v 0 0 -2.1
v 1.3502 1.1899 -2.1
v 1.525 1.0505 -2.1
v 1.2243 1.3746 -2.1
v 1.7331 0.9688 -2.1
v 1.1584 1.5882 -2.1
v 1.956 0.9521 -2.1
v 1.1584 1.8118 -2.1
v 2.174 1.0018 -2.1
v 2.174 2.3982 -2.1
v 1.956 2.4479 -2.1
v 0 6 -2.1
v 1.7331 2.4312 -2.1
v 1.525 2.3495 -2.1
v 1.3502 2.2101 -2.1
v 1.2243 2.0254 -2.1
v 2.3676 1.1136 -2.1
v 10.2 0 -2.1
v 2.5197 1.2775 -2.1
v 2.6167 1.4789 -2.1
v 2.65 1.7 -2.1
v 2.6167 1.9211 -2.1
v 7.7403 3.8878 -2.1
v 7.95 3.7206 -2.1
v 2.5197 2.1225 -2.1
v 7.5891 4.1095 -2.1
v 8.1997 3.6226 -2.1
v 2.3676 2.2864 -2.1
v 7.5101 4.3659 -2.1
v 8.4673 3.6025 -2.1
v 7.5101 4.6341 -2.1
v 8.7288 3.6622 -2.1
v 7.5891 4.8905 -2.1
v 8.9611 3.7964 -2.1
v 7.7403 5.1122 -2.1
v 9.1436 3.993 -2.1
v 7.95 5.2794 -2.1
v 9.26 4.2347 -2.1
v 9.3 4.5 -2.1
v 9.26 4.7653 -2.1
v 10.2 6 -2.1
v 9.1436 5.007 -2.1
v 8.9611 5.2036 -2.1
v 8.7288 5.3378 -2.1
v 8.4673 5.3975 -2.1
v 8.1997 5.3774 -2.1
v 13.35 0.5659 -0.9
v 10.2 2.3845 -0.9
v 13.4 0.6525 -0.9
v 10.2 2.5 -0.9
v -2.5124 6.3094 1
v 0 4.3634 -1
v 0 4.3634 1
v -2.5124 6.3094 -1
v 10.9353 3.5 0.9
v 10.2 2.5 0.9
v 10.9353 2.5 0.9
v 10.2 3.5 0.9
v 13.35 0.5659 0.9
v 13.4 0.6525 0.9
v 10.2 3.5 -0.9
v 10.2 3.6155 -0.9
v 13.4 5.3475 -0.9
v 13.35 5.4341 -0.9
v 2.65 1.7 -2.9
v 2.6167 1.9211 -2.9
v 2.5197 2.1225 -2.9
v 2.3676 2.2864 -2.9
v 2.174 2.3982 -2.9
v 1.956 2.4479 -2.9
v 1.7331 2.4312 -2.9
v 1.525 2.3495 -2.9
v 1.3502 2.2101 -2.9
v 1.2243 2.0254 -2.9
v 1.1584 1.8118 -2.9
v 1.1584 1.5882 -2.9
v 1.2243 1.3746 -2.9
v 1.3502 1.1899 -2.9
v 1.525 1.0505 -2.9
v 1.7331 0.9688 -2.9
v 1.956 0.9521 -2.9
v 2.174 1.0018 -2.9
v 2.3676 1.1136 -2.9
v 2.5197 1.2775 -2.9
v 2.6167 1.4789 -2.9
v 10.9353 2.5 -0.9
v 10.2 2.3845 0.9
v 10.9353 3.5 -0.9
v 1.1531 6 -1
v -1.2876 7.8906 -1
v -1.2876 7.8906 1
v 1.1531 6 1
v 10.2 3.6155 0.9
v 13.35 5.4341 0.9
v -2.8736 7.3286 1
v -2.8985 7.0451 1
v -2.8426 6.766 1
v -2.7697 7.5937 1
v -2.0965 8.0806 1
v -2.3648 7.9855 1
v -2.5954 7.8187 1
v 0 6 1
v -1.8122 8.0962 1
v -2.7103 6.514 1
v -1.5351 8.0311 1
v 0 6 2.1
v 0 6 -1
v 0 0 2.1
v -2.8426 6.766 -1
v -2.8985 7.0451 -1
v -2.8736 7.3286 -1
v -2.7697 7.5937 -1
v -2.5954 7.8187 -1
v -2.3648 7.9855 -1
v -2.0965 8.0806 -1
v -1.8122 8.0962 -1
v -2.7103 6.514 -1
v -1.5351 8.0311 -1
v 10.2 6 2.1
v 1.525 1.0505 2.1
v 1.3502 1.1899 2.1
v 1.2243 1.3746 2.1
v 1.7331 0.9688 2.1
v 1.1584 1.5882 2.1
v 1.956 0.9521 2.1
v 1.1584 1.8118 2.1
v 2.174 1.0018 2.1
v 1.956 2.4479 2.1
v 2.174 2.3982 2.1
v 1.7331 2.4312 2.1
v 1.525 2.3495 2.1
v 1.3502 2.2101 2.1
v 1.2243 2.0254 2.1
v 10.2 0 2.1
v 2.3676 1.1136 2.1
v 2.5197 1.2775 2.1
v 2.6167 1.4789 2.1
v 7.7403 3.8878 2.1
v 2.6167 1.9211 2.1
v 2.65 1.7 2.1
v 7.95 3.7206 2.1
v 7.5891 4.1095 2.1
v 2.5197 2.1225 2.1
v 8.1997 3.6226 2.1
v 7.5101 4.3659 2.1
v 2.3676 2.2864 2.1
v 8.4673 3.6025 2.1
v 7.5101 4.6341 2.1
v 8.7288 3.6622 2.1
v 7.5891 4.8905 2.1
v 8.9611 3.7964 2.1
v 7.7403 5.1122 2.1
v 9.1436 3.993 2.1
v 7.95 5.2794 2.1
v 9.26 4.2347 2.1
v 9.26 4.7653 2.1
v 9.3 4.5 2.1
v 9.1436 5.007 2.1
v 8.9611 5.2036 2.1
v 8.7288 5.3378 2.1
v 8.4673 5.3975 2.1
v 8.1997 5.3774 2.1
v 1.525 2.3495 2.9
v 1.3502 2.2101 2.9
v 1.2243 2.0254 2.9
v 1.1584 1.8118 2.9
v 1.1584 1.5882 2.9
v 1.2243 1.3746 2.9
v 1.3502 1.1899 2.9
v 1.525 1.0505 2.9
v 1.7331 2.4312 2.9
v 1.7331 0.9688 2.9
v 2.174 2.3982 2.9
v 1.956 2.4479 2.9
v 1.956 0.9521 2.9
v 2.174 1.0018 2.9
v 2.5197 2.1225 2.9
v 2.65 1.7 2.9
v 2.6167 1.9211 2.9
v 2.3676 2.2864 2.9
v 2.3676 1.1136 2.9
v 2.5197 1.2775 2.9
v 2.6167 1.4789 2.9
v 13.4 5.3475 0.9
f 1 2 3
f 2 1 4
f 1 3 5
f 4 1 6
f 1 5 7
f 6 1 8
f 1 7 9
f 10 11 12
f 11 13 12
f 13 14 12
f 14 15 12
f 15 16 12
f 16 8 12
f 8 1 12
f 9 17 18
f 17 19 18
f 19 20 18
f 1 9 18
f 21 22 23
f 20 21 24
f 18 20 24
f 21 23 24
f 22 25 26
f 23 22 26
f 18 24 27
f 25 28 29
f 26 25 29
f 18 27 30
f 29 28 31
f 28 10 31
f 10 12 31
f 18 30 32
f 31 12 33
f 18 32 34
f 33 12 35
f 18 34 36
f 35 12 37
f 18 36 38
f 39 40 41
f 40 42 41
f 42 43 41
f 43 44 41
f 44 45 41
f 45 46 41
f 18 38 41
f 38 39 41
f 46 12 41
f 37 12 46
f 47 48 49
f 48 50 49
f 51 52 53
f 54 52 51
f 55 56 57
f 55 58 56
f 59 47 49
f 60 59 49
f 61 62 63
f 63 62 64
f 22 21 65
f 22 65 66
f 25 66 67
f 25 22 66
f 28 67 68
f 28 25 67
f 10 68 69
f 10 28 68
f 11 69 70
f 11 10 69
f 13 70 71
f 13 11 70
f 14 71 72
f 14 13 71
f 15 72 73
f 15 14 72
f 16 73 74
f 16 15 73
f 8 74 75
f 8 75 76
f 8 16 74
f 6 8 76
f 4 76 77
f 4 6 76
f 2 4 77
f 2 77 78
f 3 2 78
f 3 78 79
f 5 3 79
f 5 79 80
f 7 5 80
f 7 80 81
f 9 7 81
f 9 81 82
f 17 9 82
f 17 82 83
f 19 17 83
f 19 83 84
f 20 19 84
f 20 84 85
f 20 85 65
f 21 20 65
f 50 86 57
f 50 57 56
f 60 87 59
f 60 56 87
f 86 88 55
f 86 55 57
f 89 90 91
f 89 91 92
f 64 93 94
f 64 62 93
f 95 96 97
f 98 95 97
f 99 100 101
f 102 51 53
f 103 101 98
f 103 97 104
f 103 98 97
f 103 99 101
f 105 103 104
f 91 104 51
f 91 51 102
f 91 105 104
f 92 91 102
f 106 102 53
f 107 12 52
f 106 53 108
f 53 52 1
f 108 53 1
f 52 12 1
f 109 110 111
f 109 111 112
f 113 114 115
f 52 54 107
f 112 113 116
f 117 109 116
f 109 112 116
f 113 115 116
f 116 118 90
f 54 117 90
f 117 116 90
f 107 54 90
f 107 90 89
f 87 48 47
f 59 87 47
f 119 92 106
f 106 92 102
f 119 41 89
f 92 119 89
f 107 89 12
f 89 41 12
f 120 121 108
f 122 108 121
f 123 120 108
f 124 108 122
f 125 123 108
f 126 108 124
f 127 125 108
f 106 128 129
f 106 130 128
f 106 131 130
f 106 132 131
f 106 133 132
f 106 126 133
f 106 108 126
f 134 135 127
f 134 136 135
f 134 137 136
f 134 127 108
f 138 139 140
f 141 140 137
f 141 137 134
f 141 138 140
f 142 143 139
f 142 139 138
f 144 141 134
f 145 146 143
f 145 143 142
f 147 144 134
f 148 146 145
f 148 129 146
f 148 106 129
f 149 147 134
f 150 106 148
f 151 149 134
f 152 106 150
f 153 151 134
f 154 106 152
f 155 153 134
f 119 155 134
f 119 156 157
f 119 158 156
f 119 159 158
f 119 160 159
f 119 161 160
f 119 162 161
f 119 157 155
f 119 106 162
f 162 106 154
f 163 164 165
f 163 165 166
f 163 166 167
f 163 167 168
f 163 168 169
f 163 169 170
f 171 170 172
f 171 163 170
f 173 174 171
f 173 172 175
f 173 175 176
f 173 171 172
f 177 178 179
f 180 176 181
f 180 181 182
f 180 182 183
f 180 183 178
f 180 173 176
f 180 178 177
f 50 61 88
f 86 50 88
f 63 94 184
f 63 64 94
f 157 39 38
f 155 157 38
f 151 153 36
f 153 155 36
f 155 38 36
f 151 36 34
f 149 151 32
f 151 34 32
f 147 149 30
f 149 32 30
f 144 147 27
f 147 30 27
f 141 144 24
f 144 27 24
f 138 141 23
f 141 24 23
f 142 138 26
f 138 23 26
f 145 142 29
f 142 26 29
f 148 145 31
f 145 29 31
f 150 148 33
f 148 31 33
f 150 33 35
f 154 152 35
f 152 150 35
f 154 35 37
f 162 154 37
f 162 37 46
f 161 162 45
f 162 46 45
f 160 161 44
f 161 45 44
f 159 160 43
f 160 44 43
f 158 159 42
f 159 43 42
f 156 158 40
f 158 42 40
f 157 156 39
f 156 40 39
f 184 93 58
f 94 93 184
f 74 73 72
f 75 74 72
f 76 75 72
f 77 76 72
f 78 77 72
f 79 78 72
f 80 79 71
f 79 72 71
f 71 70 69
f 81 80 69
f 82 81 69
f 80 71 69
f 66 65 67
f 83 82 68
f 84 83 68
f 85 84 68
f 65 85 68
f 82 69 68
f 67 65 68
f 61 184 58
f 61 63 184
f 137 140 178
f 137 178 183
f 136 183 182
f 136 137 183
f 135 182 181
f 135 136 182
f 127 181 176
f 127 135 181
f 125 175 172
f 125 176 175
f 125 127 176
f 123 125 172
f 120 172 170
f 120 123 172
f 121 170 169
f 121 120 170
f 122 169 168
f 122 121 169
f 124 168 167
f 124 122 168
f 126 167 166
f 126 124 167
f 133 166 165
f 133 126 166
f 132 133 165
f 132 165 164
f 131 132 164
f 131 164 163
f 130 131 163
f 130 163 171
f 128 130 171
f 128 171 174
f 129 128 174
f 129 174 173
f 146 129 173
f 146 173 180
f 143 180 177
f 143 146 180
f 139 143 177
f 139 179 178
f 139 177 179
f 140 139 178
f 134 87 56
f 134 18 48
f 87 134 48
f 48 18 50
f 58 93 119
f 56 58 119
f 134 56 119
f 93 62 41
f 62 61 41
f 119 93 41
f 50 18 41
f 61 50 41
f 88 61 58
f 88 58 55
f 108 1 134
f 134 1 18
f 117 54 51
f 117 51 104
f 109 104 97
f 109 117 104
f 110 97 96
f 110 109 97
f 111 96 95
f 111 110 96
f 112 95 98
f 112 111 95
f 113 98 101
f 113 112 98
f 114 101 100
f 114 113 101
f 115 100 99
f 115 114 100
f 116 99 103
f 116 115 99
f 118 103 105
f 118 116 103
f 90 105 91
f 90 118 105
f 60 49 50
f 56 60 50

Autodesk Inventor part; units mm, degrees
ref_plane "YZ Plane" through (0, 0, 0) normal (1, 0, 0) x (0, 1, 0)
ref_plane "XZ Plane" through (0, 0, 0) normal (0, 1, 0) x (-1, 0, 0)
ref_plane "XY Plane" through (0, 0, 0) normal (0, 0, 1) x (1, 0, 0)
sketch "Sketch1" plane through (0, 0, 0) normal (0, 0, 1) x (1, 0, 0)
  line L0 (0, 0) -> (10.2, 0)
  line L1 (10.2, 0) -> (10.2, 6)
  line L2 (10.2, 6) -> (0, 6)
  line L3 (0, 6) -> (0, 0)
  circle A0 centre (8.4, 4.5) radius 0.9
  line L4 (10.2, 3.5) -> (10.9353, 3.5)
  line L5 (10.9353, 3.5) -> (10.9353, 2.5)
  line L6 (10.9353, 2.5) -> (10.2, 2.5)
  line L7 (10.2, 2.5) -> (10.2, 3.5)
  line L8 (10.2, 3.5) -> (10.15, 3.5866)
  line L9 (10.15, 3.5866) -> (13.35, 5.4341)
  line L10 (13.35, 5.4341) -> (13.4, 5.3475)
  line L11 (13.4, 5.3475) -> (10.2, 3.5)
  line L12 (10.2, 2.5) -> (10.15, 2.4134)
  line L13 (10.15, 2.4134) -> (13.35, 0.5659)
  line L14 (13.35, 0.5659) -> (13.4, 0.6525)
  line L15 (13.4, 0.6525) -> (10.2, 2.5)
  circle A1 centre (1.9, 1.7) radius 0.75
  line L16 (0, 4.3634) -> (-2.5124, 6.3094)
  line L17 (-2.5124, 6.3094) -> (-1.2876, 7.8906)
  line L18 (-1.2876, 7.8906) -> (1.1531, 6)
  arc A2 (-1.2876, 7.8906) -> (-2.5124, 6.3094) centre (-1.9, 7.1) ccw
  point P0 (10.9353, 3)
  point P1 (10.2, 3)
  dimension "d0" = 10.2
  dimension "d1" = 6
  dimension "d2" = 1.8
  dimension "d3" = 1.5
  dimension "d4" = 1.8
  dimension "d5" = 2.8
  dimension "d6" = 6.5
  dimension "d7" = 1.5
  dimension "d8" = 0.1
  dimension "d9" = 0.1
  dimension "d10" = 2.1
  dimension "d11" = 13.1
  dimension "d12" = 30
  dimension "d13" = 30
  dimension "d15" = 1
  dimension "d16" = 5
  dimension "d17" = 2
extrude "Extrusion1" add sketch "Sketch1" along normal mid plane 4.2 contours L3 L2 L1 L9 L8 L12 L13 L0 | L13 L12 L1 | L8 L9 L1
extrude "Extrusion2" add sketch "Sketch1" along normal mid plane 1.8 contours L13 L12 L1 | L1 L15 L14 L13 | L1 L4 L5 L6 | L8 L9 L1 | L1 L9 L10 L11
extrude "Extrusion3" add sketch "Sketch1" along normal mid plane 5.8 contours A1
extrude "Extrusion4" add sketch "Sketch1" along normal mid plane 2 contours L16 L17 L18 L2 L3 | A2 L17
sketch "Sketch2" plane through (10.2, 2.5, 0.9) normal (0.5, 0.866, 0) x (0.866, -0.5, 0)
  line L0 (0, 0) -> (0, 1.8) projected
  line L1 (3.695, 0) -> (0, 0) projected
  line L2 (3.695, 1.8) -> (3.695, 0) projected
  line L3 (0, 1.8) -> (3.695, 1.8) projected
  line L4 (2.795, 0.9) -> (3.695, 0.9) construction
  point P0 (-7.5835, 0.9)
  dimension "d26" = 0.9
  dimension "d27" = 0.9
sketch "Sketch3" plane through (13.4, 5.3475, -0.9) normal (0.5, -0.866, 0) x (0.866, 0.5, 0)
  line L0 (0, 0) -> (0, 1.8) projected
  line L1 (-3.695, 1.8) -> (0, 1.8) projected
  line L2 (-3.695, 0) -> (-3.695, 1.8) projected
  line L3 (0, 0) -> (-3.695, 0) projected
  line L4 (0, 0) -> (0, 1.8) construction
  line L5 (0, 0.9) -> (-0.9, 0.9) construction
  point P0 (-14.2785, 0.9)
  dimension "d28" = 0.9
  dimension "d29" = 0.9
equation "\"d27\" = d26"
equation "\"d29\" = d28"
properties part number "LimitSwitch" material "ABS Plastic"
